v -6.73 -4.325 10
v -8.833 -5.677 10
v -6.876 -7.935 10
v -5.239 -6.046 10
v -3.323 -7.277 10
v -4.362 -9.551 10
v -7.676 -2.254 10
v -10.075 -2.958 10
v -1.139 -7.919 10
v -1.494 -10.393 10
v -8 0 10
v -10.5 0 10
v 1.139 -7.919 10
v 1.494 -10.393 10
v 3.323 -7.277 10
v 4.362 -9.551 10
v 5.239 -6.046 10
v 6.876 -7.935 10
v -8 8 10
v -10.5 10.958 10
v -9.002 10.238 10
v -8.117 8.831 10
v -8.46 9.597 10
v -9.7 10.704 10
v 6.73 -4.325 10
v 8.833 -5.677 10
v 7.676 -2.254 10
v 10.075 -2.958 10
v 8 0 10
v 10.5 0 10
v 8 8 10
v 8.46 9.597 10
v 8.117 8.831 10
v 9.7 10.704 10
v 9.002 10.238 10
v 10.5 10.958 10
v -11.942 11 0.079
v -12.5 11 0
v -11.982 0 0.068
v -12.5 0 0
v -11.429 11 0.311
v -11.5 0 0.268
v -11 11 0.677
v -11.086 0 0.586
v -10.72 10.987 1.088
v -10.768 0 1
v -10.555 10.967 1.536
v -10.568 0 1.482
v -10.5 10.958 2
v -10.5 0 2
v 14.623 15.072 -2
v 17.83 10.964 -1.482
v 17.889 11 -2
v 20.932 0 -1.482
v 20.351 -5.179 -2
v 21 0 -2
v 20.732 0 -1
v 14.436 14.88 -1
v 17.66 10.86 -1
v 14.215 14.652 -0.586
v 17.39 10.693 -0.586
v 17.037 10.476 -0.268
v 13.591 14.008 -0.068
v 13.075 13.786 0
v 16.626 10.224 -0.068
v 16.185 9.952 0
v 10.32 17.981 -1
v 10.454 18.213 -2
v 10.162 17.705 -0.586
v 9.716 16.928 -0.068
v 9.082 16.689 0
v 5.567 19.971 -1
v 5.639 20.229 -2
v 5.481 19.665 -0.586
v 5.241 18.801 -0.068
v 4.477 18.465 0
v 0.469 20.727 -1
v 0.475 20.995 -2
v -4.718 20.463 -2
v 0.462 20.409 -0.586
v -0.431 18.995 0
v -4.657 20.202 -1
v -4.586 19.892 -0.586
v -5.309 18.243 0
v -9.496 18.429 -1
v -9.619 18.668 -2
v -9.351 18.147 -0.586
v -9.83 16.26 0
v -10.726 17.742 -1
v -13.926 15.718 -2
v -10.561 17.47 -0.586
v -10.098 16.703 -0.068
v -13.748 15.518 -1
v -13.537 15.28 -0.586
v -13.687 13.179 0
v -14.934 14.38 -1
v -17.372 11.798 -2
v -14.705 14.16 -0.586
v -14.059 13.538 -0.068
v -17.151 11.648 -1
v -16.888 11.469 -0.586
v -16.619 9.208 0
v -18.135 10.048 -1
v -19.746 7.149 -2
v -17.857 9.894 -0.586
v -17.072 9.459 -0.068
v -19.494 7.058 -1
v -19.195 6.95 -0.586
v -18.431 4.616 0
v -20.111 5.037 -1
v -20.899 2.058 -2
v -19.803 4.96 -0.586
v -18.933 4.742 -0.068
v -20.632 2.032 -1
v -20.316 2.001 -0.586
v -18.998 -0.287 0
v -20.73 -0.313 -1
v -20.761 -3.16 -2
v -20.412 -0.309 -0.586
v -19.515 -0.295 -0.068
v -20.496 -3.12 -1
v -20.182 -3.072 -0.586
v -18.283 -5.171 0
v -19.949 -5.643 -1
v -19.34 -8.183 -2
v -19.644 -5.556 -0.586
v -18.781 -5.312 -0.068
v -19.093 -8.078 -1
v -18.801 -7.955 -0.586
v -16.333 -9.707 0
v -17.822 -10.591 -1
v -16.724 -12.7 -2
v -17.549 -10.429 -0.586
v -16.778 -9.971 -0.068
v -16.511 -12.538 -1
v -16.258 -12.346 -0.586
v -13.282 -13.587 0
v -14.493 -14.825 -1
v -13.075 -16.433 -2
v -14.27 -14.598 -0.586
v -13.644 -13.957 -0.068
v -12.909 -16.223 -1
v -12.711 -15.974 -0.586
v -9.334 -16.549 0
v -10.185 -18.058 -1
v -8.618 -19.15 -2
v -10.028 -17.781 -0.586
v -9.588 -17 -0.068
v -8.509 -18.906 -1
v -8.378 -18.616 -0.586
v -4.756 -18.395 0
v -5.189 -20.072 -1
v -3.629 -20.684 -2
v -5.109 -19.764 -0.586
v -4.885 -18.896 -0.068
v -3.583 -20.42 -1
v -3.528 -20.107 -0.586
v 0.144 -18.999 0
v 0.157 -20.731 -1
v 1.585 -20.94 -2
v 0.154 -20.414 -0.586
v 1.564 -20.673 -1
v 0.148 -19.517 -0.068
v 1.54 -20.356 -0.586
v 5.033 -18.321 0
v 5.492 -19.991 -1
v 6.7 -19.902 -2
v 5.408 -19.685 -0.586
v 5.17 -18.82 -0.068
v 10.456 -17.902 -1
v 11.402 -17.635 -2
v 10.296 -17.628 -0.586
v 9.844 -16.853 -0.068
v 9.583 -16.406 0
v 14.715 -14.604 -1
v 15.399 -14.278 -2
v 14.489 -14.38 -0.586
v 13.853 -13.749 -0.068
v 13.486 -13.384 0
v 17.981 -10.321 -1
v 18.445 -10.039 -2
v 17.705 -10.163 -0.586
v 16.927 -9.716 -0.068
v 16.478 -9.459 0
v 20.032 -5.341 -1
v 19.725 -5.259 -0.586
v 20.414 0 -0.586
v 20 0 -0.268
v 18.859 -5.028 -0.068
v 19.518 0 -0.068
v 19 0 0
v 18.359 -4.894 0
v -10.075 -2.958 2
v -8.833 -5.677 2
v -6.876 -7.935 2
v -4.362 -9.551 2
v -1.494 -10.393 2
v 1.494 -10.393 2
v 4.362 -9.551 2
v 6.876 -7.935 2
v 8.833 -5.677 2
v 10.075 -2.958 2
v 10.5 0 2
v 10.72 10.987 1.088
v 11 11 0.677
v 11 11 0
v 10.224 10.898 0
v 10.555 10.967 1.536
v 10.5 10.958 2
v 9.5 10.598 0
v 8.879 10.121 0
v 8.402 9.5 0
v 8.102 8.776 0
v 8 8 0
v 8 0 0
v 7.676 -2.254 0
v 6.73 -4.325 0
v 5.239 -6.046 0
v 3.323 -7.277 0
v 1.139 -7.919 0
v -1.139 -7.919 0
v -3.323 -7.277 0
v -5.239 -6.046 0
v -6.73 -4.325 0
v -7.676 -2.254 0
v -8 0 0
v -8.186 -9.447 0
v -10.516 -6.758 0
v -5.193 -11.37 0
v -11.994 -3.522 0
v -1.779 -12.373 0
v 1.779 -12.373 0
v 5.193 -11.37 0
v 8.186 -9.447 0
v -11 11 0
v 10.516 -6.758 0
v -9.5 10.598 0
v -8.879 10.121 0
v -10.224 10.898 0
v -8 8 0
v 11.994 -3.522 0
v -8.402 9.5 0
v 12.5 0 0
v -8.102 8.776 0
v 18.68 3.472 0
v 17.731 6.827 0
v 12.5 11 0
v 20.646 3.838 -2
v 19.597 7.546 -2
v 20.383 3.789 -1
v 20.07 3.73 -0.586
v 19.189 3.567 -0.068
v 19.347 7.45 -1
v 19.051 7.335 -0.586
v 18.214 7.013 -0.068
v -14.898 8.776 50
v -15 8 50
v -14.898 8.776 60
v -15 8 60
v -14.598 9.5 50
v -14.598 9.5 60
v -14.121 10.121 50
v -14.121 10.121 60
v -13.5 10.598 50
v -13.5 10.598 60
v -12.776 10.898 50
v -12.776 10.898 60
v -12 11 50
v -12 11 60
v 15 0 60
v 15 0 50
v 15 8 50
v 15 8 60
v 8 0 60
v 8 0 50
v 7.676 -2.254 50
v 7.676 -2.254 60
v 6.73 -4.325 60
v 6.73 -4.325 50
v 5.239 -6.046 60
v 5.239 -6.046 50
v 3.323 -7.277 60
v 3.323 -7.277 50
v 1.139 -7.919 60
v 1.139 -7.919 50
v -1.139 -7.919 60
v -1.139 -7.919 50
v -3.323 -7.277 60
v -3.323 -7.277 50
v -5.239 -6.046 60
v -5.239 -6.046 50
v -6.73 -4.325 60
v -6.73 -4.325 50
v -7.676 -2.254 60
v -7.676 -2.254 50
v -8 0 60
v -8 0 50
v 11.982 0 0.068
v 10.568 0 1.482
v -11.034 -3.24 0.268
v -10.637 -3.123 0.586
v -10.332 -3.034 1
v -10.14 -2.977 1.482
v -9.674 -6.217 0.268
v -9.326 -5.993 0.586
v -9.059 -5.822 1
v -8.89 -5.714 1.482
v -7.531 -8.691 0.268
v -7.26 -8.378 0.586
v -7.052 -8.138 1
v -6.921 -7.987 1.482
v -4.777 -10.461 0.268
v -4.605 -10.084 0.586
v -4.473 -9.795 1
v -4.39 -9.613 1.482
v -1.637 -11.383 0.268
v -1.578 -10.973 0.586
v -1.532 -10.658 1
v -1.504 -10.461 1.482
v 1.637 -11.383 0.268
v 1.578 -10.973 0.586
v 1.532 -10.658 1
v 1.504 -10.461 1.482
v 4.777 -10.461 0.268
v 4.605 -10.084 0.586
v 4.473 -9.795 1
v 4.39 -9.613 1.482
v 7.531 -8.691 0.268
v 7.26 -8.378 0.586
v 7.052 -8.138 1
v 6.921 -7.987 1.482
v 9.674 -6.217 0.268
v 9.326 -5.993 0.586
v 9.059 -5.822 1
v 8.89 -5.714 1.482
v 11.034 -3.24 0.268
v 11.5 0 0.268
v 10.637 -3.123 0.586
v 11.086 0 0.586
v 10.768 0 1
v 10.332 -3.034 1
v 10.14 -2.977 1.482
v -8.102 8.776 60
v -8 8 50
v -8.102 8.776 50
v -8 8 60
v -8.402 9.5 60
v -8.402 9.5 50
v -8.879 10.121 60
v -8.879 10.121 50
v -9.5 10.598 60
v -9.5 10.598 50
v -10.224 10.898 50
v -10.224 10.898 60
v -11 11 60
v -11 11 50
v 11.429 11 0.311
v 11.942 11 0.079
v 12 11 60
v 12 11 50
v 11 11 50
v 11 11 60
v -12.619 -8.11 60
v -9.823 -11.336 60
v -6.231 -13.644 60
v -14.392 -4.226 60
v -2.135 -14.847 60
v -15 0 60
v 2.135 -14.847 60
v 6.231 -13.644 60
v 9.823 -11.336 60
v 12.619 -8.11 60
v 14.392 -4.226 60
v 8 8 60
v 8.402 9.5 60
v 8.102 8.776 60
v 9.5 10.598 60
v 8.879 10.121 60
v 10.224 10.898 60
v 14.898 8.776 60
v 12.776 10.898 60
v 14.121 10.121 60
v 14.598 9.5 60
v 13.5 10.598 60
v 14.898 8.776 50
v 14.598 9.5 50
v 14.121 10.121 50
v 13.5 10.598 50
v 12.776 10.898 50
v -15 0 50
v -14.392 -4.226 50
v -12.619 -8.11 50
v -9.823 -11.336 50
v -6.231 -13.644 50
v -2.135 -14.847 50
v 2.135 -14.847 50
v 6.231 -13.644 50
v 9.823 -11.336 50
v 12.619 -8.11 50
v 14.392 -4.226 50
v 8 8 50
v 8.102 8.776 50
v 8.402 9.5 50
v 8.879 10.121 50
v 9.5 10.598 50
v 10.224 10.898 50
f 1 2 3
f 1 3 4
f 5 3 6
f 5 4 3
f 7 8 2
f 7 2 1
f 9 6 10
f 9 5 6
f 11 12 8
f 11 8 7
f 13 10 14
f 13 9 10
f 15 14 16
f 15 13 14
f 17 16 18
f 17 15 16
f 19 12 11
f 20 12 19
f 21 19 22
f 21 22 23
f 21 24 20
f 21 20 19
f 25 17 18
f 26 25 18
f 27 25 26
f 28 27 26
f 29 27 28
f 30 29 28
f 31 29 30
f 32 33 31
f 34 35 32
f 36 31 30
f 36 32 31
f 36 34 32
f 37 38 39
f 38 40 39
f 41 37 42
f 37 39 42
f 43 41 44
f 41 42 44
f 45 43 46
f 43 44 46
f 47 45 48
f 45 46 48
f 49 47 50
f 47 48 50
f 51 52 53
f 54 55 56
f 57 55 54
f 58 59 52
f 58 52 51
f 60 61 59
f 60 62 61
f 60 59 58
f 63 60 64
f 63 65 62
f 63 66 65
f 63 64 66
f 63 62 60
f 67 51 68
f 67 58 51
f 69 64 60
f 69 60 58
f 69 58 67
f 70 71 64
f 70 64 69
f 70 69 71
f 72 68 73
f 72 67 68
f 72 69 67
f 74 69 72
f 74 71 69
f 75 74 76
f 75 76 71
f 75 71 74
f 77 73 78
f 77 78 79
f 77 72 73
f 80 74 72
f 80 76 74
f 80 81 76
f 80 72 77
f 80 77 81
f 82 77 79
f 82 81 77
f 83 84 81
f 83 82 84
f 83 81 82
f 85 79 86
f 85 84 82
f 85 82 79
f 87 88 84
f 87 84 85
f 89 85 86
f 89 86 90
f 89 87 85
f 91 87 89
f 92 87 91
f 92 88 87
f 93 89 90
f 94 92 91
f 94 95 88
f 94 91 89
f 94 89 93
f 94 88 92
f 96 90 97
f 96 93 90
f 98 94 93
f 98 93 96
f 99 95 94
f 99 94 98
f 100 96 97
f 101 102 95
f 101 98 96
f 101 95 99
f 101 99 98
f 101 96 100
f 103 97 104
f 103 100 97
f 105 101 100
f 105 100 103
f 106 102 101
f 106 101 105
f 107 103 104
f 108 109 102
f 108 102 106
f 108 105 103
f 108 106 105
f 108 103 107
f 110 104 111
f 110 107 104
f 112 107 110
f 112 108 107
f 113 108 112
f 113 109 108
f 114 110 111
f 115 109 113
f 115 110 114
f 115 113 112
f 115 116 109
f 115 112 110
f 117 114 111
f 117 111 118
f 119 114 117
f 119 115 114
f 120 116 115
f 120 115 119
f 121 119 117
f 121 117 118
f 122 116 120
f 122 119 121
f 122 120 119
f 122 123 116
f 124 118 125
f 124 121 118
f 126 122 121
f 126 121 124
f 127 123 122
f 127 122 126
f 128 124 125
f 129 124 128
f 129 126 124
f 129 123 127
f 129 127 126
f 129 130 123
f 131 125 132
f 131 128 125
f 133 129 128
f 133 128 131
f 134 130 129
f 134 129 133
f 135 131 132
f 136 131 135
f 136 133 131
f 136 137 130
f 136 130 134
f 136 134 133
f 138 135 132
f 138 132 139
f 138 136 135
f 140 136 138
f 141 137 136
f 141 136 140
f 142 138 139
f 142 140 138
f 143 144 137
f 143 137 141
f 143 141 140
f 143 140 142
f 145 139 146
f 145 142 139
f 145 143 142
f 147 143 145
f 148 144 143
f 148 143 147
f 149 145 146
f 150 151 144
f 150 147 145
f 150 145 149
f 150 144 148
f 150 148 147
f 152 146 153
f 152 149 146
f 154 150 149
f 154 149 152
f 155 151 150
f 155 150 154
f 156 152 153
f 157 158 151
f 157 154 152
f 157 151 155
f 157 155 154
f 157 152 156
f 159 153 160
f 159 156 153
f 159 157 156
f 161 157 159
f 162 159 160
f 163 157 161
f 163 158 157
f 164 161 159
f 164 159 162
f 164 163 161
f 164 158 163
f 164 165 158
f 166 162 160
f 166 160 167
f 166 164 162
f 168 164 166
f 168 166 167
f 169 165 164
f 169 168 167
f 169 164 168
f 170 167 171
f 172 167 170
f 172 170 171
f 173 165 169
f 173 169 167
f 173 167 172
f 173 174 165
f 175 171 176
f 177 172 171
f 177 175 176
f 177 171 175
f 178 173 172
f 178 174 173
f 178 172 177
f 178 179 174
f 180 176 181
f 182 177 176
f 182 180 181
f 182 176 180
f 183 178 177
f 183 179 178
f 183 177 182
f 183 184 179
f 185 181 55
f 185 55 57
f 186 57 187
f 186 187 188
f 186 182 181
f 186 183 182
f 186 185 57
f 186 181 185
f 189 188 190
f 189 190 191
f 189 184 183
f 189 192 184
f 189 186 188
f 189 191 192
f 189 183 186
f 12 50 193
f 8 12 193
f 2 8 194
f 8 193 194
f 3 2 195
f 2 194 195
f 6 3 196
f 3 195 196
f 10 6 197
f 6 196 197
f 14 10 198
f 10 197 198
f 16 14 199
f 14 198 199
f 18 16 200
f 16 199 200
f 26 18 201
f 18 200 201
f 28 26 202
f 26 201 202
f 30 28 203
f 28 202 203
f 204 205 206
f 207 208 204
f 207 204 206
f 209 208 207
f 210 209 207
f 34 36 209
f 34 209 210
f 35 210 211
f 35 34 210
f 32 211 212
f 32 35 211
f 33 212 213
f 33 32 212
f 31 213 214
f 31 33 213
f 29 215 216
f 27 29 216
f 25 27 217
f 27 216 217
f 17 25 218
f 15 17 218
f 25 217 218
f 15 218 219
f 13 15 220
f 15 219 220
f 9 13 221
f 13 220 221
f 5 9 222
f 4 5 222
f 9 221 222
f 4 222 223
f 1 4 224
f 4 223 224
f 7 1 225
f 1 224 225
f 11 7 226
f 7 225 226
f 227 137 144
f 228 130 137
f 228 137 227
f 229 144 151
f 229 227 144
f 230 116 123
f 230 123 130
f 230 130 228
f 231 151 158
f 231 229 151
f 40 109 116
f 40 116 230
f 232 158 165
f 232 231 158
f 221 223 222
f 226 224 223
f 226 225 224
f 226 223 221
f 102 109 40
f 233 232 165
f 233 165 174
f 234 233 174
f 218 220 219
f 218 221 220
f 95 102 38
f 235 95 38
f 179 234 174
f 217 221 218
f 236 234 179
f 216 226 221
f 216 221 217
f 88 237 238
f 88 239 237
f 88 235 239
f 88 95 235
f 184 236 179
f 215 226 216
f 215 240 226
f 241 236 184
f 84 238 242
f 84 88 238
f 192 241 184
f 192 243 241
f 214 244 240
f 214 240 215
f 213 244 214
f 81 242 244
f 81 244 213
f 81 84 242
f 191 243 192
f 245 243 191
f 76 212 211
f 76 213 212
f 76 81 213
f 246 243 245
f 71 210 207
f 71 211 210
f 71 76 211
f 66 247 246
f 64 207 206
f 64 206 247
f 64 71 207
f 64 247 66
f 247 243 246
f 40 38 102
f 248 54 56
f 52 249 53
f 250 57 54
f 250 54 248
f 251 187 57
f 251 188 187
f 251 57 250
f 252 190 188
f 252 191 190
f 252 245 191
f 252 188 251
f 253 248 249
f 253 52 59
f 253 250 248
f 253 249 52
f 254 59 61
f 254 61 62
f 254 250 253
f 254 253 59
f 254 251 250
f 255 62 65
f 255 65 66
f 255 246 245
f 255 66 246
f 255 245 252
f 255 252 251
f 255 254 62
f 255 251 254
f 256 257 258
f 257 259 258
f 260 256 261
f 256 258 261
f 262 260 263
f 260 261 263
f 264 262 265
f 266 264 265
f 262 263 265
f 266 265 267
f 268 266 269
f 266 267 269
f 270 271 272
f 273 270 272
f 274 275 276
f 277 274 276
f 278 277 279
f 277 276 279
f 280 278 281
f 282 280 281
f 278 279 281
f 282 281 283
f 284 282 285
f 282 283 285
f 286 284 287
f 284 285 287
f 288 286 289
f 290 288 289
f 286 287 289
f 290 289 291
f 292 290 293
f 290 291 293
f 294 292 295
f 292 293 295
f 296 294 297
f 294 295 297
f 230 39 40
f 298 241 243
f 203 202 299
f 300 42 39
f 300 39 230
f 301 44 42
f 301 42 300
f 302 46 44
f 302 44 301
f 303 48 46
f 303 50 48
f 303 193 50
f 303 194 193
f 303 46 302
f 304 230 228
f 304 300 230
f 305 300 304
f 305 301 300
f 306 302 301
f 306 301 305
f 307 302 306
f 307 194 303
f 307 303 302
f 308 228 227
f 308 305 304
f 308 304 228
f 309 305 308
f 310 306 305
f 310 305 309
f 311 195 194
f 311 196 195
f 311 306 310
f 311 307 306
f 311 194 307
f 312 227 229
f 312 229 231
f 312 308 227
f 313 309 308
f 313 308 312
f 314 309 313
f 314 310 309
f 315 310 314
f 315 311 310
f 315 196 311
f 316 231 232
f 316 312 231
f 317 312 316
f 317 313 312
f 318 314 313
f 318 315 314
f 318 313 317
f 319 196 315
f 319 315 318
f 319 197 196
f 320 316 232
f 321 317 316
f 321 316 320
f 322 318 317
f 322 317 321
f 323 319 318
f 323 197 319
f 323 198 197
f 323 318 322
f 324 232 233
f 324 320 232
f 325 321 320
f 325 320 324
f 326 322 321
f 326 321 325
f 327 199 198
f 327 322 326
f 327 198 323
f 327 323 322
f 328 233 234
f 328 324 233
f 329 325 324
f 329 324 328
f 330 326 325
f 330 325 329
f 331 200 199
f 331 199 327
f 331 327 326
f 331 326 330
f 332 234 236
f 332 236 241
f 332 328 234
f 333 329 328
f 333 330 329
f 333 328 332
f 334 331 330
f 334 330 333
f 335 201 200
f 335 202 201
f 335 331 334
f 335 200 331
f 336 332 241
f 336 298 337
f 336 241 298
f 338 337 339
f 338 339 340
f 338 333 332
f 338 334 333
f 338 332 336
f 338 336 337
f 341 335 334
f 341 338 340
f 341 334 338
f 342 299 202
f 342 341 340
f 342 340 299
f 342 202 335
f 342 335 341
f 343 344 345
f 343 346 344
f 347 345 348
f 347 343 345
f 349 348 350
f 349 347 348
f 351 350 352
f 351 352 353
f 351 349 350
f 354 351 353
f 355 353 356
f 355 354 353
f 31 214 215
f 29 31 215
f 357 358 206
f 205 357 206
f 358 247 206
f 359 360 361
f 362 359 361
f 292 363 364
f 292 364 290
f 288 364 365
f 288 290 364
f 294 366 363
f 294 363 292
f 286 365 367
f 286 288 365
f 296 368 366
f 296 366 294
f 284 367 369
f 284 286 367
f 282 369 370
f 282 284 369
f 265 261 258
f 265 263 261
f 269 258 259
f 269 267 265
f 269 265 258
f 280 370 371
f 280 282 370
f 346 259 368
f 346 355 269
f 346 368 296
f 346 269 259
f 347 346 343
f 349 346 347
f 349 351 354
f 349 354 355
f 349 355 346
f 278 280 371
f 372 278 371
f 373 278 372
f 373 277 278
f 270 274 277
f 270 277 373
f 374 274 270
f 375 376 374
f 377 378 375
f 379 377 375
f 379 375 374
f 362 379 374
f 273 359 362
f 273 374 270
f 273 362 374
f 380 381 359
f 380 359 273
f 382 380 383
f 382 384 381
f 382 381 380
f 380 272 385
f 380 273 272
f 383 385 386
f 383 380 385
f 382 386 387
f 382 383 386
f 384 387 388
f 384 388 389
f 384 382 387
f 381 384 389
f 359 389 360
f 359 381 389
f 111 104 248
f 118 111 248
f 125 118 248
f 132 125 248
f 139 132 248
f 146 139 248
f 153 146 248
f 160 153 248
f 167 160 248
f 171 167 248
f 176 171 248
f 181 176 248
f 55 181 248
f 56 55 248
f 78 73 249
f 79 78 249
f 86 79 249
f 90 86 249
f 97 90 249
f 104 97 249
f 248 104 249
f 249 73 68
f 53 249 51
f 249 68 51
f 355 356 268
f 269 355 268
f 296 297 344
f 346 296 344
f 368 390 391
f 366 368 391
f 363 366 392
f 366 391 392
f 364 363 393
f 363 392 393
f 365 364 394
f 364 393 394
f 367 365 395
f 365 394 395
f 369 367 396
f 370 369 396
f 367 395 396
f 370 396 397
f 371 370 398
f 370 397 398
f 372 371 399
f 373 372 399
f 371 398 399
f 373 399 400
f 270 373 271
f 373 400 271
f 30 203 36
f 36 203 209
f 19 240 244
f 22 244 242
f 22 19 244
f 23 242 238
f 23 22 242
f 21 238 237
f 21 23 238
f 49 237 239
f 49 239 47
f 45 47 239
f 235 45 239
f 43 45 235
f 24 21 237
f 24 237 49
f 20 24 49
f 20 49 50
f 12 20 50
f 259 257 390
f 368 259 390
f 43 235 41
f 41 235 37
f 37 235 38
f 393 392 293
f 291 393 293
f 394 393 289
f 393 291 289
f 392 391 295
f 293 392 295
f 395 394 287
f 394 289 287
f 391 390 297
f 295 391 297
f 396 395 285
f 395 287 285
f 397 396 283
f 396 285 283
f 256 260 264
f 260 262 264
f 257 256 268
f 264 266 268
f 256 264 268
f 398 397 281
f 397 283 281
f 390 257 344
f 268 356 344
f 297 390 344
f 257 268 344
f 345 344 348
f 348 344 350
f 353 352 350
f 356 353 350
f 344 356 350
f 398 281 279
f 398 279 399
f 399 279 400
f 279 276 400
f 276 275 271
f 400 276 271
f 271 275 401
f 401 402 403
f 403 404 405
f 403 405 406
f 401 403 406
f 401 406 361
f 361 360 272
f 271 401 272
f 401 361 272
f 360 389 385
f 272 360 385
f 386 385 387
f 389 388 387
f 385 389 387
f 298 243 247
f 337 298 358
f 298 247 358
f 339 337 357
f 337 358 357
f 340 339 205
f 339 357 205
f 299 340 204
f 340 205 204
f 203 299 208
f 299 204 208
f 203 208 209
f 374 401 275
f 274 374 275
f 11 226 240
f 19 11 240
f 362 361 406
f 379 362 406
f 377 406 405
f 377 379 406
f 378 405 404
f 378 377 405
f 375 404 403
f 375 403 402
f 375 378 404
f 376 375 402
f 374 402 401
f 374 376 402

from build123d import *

# Parameters (mm, degrees)
F1_DEPTH = 2
F2_DEPTH = 10
F3_R     = 1.99999
F4_R     = 3
F7_DEPTH = 10
F8_R     = 3


# Not quite as in the source:
# - a fillet or chamfer is up to 0.001 mm smaller than in the source, because OpenCascade refuses the exact size


with BuildPart() as f1:
    # F0 (on Top) → F1 (new body)
    with BuildSketch(Plane.XY):
        with BuildLine():
            ThreePointArc((-17.88854382, 11), (-5.7157930237, -20.2071697699), (21, 0))
            ThreePointArc((21, 0), (20.2071697699, 5.7157930237), (17.88854382, 11))
            Line((17.88854382, 11), (10.5, 11))
            Line((10.5, 11), (10.5, 0))
            ThreePointArc((10.5, 0), (0, -10.5), (-10.5, 0))
            Line((-10.5, 0), (-10.5, 11))
            Line((-10.5, 11), (-17.88854382, 11))
        make_face()
        with BuildLine():
            Line((10.5, 11), (17.88854382, 11))
            ThreePointArc((17.88854382, 11), (0, 21), (-17.88854382, 11))
            Line((-17.88854382, 11), (-10.5, 11))
            Line((-10.5, 11), (-8, 11))
            Line((-8, 11), (8, 11))
            Line((8, 11), (10.5, 11))
        make_face()
        with BuildLine():
            ThreePointArc((-8, 0), (0, -8), (8, 0))
            ThreePointArc((8, 0), (0, 8), (-8, 0))
        make_face()
        with BuildLine():
            Line((8, 0), (8, 6.8007352544))
            ThreePointArc((8, 6.8007352544), (0, 10.5), (-8, 6.8007352544))
            Line((-8, 6.8007352544), (-8, 0))
            ThreePointArc((-8, 0), (0, 8), (8, 0))
        make_face()
        with BuildLine():
            ThreePointArc((-10.5, 0), (0, -10.5), (10.5, 0))
            ThreePointArc((10.5, 0), (9.8552016722, 3.6228441865), (8, 6.8007352544))
            Line((8, 6.8007352544), (8, 0))
            ThreePointArc((8, 0), (0, -8), (-8, 0))
            Line((-8, 0), (-8, 6.8007352544))
            ThreePointArc((-8, 6.8007352544), (-9.8552016722, 3.6228441865), (-10.5, 0))
        make_face()
        with BuildLine():
            Line((-8, 11), (-10.5, 11))
            Line((-10.5, 11), (-10.5, 0))
            ThreePointArc((-10.5, 0), (-9.8552016722, 3.6228441865), (-8, 6.8007352544))
            Line((-8, 6.8007352544), (-8, 11))
        make_face()
        with BuildLine():
            Line((8, 6.8007352544), (8, 11))
            Line((8, 11), (-8, 11))
            Line((-8, 11), (-8, 6.8007352544))
            ThreePointArc((-8, 6.8007352544), (0, 10.5), (8, 6.8007352544))
        make_face()
        with BuildLine():
            Line((10.5, 0), (10.5, 11))
            Line((10.5, 11), (8, 11))
            Line((8, 11), (8, 6.8007352544))
            ThreePointArc((8, 6.8007352544), (9.8552016722, 3.6228441865), (10.5, 0))
        make_face()
    extrude(amount=-F1_DEPTH)

    # F0 (on Top) → F2 (join)
    with BuildSketch(Plane.XY):
        with BuildLine():
            Line((10.5, 0), (10.5, 11))
            Line((10.5, 11), (8, 11))
            Line((8, 11), (8, 6.8007352544))
            ThreePointArc((8, 6.8007352544), (9.8552016722, 3.6228441865), (10.5, 0))
        make_face()
        with BuildLine():
            ThreePointArc((-10.5, 0), (0, -10.5), (10.5, 0))
            ThreePointArc((10.5, 0), (9.8552016722, 3.6228441865), (8, 6.8007352544))
            Line((8, 6.8007352544), (8, 0))
            ThreePointArc((8, 0), (0, -8), (-8, 0))
            Line((-8, 0), (-8, 6.8007352544))
            ThreePointArc((-8, 6.8007352544), (-9.8552016722, 3.6228441865), (-10.5, 0))
        make_face()
        with BuildLine():
            Line((-8, 11), (-10.5, 11))
            Line((-10.5, 11), (-10.5, 0))
            ThreePointArc((-10.5, 0), (-9.8552016722, 3.6228441865), (-8, 6.8007352544))
            Line((-8, 6.8007352544), (-8, 11))
        make_face()
    extrude(amount=F2_DEPTH)

    # F3 (radius 2 in the source; OpenCascade refuses exactly that, so slightly less here)
    f3_edges = [f1.edges().sort_by_distance(p)[0] for p in [
        (-21, 0, 0),
        (0, -10.5, 0),
        (10.5, 5.5, 0),
        (-10.5, 5.5, 0),
    ]]
    fillet(f3_edges, radius=F3_R)

    # F4
    f4_edges = [f1.edges().sort_by_distance(p)[0] for p in [
        (-8, 11, 5),
        (8, 11, 5),
    ]]
    fillet(f4_edges, radius=F4_R)


with BuildPart() as f7:
    # F6 (on offset) → F7 (new body)
    with BuildSketch(Plane.XY.offset(50)):
        with BuildLine():
            Line((-15, 11), (-15, 0))
            ThreePointArc((-15, 0), (-13.7471921753, 6.0012254829), (-10.1980390272, 11))
            Line((-10.1980390272, 11), (-15, 11))
        make_face()
        with BuildLine():
            ThreePointArc((-10.1980390272, 11), (-13.7471921753, 6.0012254829), (-15, 0))
            ThreePointArc((-15, 0), (0, -15), (15, 0))
            ThreePointArc((15, 0), (13.7471921753, 6.0012254829), (10.1980390272, 11))
            Line((10.1980390272, 11), (8, 11))
            Line((8, 11), (8, 0))
            ThreePointArc((8, 0), (0, -8), (-8, 0))
            Line((-8, 0), (-8, 11))
            Line((-8, 11), (-10.1980390272, 11))
        make_face()
        with BuildLine():
            ThreePointArc((10.1980390272, 11), (13.7471921753, 6.0012254829), (15, 0))
            Line((15, 0), (15, 11))
            Line((15, 11), (10.1980390272, 11))
        make_face()
    extrude(amount=F7_DEPTH)

    # F8
    f8_edges = [f7.edges().sort_by_distance(p)[0] for p in [
        (-8, 11, 55),
        (8, 11, 55),
        (-15, 11, 55),
        (15, 11, 55),
    ]]
    fillet(f8_edges, radius=F8_R)


solid = Compound([f1.part, f7.part])
